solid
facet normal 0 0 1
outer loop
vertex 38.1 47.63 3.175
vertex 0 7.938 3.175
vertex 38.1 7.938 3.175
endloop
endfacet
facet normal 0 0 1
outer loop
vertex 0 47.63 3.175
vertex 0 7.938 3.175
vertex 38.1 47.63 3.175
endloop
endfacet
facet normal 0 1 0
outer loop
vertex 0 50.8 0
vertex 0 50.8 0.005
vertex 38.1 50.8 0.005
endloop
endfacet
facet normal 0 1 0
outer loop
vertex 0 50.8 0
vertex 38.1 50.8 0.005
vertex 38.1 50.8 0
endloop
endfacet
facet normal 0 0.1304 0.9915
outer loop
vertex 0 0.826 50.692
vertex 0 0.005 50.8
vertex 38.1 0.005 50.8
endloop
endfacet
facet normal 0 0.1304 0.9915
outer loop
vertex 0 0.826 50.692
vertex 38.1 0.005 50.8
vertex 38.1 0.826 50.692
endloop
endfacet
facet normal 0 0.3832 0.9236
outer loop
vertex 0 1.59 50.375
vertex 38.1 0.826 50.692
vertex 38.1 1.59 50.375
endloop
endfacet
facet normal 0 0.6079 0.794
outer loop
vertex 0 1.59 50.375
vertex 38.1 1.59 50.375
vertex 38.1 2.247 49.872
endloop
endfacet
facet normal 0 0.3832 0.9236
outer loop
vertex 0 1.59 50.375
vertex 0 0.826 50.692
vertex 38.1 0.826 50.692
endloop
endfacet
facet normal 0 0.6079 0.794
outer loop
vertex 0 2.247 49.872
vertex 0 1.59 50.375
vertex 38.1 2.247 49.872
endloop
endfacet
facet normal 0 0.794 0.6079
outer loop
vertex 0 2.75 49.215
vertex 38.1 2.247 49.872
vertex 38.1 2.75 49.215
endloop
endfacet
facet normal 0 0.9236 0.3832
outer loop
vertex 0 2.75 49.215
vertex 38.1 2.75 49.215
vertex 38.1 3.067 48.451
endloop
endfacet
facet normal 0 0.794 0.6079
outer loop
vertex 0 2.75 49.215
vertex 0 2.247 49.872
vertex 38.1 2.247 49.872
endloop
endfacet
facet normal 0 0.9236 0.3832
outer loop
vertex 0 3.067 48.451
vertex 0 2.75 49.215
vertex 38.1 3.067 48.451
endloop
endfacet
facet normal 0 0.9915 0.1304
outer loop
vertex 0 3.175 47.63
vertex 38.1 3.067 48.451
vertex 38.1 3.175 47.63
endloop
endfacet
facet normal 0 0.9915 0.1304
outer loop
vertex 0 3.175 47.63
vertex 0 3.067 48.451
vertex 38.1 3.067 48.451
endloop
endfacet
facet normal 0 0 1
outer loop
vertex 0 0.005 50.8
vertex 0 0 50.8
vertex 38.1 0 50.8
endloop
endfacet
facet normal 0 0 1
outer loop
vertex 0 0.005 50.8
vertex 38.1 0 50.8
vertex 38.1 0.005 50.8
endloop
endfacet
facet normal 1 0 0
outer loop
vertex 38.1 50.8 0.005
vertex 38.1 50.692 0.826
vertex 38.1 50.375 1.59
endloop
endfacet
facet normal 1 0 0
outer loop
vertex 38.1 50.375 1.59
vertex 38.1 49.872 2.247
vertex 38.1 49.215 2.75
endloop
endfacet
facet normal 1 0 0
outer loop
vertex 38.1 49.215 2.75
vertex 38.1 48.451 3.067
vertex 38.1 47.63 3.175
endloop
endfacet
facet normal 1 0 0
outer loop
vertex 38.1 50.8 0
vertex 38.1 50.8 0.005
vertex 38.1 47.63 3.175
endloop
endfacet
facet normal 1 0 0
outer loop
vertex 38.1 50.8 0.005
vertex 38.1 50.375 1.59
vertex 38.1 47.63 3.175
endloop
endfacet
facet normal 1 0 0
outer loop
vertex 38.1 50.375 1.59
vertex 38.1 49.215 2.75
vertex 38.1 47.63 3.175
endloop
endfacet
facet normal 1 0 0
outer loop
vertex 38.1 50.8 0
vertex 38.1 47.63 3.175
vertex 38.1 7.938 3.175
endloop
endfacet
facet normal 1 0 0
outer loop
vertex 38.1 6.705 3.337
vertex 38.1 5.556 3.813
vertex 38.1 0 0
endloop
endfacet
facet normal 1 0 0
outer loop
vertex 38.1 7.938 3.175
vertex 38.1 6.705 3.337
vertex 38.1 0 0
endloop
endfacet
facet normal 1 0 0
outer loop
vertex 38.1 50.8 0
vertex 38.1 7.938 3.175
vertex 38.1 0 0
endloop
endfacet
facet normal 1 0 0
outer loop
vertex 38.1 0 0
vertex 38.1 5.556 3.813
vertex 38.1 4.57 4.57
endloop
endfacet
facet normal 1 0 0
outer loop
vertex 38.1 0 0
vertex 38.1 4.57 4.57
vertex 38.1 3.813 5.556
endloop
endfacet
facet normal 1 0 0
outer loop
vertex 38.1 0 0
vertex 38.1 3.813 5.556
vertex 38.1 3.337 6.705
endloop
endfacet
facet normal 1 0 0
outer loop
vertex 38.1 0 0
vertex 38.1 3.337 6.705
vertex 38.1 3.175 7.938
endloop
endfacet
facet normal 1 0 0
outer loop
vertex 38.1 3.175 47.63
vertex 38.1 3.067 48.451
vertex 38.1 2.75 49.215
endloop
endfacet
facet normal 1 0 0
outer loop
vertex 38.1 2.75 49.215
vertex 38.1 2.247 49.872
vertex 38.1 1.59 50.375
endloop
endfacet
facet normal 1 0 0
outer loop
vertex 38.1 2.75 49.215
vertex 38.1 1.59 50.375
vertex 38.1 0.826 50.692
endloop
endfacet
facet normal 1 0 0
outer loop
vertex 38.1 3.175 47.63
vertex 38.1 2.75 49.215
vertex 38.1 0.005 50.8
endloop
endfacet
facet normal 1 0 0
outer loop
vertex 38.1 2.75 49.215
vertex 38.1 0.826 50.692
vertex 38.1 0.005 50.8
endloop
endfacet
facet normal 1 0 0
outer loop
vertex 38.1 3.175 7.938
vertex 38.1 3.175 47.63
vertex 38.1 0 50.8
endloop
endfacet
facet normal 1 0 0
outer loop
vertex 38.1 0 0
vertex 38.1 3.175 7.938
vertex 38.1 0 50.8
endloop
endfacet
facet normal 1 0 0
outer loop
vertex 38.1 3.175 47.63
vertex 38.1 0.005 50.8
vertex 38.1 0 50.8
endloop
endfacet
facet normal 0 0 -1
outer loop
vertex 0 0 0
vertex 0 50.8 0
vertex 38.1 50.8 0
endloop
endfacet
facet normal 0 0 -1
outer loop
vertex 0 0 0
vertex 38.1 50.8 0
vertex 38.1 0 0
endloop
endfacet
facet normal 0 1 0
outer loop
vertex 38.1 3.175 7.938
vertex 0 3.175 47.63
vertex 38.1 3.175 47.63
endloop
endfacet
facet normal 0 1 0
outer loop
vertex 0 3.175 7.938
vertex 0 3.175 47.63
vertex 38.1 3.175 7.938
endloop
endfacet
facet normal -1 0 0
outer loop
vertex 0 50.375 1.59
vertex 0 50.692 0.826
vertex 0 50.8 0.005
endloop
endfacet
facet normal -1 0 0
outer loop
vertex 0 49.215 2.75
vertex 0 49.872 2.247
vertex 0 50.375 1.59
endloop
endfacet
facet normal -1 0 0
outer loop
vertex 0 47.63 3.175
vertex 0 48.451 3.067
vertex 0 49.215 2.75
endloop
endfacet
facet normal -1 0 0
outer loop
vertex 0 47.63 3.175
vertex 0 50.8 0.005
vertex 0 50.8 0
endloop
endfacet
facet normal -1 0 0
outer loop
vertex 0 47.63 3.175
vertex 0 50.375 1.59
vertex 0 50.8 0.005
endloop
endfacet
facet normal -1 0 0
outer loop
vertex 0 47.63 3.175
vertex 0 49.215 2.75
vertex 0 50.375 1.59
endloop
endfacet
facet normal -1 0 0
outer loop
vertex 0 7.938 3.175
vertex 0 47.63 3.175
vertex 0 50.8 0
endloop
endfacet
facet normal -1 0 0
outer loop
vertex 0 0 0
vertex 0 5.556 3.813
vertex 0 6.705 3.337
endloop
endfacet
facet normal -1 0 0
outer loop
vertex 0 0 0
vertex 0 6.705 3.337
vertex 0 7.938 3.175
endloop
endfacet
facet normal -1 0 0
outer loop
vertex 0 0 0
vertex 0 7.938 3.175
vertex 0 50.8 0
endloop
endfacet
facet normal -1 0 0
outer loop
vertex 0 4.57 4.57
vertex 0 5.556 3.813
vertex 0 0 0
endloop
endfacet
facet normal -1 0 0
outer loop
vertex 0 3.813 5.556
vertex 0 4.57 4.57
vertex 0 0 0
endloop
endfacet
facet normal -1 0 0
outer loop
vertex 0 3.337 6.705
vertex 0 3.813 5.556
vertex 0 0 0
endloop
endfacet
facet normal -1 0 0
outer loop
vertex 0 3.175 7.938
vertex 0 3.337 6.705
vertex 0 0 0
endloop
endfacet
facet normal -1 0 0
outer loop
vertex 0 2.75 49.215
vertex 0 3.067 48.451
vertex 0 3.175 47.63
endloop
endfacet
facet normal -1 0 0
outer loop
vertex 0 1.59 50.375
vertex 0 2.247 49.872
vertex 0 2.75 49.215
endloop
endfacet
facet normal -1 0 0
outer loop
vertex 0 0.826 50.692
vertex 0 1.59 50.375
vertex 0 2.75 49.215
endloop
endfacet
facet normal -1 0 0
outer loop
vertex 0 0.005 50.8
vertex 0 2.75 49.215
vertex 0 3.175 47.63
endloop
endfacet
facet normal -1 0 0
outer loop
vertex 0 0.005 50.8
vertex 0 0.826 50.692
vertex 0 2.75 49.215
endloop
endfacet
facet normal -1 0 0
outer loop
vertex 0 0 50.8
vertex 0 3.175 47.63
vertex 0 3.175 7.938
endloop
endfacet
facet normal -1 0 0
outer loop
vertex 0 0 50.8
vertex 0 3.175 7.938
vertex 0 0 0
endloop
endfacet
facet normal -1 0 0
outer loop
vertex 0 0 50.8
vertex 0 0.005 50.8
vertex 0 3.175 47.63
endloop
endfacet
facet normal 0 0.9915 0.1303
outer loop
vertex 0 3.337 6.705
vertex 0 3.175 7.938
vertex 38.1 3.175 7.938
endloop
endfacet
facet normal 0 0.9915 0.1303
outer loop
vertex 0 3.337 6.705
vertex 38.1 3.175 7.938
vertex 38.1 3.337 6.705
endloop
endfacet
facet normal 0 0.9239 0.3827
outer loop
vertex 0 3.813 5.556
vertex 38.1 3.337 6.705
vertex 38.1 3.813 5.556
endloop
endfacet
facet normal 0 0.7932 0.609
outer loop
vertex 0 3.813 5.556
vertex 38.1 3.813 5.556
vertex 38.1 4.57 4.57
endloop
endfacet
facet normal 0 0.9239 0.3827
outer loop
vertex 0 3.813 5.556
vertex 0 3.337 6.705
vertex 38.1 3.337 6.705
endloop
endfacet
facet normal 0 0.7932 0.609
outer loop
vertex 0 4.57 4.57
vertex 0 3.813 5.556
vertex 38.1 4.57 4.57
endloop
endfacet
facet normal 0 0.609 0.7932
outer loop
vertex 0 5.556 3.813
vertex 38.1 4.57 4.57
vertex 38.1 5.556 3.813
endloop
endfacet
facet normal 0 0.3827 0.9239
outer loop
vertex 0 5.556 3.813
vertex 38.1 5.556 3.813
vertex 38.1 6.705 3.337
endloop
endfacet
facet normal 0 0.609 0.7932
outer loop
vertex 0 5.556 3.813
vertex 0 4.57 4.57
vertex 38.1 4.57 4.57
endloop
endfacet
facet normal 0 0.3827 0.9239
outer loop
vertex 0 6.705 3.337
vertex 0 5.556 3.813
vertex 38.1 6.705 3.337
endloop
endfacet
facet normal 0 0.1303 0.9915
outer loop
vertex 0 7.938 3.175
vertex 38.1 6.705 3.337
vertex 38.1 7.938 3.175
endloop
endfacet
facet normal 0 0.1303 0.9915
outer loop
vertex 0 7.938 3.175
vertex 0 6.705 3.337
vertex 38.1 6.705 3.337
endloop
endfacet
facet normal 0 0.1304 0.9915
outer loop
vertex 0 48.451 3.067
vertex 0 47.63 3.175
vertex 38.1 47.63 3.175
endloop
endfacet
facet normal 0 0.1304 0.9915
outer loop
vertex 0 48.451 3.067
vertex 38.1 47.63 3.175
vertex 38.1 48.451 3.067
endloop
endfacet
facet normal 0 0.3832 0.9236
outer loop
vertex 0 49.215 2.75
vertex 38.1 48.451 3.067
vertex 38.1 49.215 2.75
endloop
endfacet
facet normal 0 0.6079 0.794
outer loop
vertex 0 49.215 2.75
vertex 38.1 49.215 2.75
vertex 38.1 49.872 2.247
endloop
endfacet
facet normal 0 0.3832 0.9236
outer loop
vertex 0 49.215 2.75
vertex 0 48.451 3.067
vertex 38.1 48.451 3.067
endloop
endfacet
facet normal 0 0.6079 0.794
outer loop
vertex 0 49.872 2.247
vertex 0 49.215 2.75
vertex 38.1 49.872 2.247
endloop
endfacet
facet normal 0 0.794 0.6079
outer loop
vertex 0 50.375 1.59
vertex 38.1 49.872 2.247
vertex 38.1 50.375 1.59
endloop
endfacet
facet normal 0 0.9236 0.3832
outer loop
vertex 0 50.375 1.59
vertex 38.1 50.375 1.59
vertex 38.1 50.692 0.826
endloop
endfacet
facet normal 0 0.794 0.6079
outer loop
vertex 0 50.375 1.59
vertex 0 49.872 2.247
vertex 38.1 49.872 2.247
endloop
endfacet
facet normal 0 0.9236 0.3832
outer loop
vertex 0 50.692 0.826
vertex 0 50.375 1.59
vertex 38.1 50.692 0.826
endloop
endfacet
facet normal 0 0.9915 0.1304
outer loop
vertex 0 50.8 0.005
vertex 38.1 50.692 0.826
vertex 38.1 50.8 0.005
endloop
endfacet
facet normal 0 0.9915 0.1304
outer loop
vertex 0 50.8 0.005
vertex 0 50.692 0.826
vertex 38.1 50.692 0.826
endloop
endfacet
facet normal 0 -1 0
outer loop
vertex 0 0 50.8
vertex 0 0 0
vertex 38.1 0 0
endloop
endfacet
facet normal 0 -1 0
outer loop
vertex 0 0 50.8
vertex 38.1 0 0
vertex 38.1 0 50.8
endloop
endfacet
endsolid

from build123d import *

# Parameters (mm, degrees)
HIERRO_ANGULAR_2_X_2_X_0_125_1_DEPTH = 38.1


with BuildPart() as part:
    # Sketch12 → Hierro angular 2 X 2 X 0.125(1) (new body)
    with BuildSketch(Plane.YZ):
        with BuildLine():
            Line((0, 0), (0, 50.8))
            Line((0, 50.8), (0.00508, 50.8))
            ThreePointArc((0.00508, 50.8), (2.246551928, 49.871551928), (3.175, 47.63008))
            Line((3.175, 47.63008), (3.175, 7.9375))
            ThreePointArc((3.175, 7.9375), (4.569903955, 4.569903955), (7.9375, 3.175))
            Line((7.9375, 3.175), (47.63008, 3.175))
            ThreePointArc((47.63008, 3.175), (49.871551928, 2.246551928), (50.8, 0.00508))
            Line((50.8, 0.00508), (50.8, 0))
            Line((50.8, 0), (0, 0))
        make_face()
    extrude(amount=HIERRO_ANGULAR_2_X_2_X_0_125_1_DEPTH)


solid = part.part
